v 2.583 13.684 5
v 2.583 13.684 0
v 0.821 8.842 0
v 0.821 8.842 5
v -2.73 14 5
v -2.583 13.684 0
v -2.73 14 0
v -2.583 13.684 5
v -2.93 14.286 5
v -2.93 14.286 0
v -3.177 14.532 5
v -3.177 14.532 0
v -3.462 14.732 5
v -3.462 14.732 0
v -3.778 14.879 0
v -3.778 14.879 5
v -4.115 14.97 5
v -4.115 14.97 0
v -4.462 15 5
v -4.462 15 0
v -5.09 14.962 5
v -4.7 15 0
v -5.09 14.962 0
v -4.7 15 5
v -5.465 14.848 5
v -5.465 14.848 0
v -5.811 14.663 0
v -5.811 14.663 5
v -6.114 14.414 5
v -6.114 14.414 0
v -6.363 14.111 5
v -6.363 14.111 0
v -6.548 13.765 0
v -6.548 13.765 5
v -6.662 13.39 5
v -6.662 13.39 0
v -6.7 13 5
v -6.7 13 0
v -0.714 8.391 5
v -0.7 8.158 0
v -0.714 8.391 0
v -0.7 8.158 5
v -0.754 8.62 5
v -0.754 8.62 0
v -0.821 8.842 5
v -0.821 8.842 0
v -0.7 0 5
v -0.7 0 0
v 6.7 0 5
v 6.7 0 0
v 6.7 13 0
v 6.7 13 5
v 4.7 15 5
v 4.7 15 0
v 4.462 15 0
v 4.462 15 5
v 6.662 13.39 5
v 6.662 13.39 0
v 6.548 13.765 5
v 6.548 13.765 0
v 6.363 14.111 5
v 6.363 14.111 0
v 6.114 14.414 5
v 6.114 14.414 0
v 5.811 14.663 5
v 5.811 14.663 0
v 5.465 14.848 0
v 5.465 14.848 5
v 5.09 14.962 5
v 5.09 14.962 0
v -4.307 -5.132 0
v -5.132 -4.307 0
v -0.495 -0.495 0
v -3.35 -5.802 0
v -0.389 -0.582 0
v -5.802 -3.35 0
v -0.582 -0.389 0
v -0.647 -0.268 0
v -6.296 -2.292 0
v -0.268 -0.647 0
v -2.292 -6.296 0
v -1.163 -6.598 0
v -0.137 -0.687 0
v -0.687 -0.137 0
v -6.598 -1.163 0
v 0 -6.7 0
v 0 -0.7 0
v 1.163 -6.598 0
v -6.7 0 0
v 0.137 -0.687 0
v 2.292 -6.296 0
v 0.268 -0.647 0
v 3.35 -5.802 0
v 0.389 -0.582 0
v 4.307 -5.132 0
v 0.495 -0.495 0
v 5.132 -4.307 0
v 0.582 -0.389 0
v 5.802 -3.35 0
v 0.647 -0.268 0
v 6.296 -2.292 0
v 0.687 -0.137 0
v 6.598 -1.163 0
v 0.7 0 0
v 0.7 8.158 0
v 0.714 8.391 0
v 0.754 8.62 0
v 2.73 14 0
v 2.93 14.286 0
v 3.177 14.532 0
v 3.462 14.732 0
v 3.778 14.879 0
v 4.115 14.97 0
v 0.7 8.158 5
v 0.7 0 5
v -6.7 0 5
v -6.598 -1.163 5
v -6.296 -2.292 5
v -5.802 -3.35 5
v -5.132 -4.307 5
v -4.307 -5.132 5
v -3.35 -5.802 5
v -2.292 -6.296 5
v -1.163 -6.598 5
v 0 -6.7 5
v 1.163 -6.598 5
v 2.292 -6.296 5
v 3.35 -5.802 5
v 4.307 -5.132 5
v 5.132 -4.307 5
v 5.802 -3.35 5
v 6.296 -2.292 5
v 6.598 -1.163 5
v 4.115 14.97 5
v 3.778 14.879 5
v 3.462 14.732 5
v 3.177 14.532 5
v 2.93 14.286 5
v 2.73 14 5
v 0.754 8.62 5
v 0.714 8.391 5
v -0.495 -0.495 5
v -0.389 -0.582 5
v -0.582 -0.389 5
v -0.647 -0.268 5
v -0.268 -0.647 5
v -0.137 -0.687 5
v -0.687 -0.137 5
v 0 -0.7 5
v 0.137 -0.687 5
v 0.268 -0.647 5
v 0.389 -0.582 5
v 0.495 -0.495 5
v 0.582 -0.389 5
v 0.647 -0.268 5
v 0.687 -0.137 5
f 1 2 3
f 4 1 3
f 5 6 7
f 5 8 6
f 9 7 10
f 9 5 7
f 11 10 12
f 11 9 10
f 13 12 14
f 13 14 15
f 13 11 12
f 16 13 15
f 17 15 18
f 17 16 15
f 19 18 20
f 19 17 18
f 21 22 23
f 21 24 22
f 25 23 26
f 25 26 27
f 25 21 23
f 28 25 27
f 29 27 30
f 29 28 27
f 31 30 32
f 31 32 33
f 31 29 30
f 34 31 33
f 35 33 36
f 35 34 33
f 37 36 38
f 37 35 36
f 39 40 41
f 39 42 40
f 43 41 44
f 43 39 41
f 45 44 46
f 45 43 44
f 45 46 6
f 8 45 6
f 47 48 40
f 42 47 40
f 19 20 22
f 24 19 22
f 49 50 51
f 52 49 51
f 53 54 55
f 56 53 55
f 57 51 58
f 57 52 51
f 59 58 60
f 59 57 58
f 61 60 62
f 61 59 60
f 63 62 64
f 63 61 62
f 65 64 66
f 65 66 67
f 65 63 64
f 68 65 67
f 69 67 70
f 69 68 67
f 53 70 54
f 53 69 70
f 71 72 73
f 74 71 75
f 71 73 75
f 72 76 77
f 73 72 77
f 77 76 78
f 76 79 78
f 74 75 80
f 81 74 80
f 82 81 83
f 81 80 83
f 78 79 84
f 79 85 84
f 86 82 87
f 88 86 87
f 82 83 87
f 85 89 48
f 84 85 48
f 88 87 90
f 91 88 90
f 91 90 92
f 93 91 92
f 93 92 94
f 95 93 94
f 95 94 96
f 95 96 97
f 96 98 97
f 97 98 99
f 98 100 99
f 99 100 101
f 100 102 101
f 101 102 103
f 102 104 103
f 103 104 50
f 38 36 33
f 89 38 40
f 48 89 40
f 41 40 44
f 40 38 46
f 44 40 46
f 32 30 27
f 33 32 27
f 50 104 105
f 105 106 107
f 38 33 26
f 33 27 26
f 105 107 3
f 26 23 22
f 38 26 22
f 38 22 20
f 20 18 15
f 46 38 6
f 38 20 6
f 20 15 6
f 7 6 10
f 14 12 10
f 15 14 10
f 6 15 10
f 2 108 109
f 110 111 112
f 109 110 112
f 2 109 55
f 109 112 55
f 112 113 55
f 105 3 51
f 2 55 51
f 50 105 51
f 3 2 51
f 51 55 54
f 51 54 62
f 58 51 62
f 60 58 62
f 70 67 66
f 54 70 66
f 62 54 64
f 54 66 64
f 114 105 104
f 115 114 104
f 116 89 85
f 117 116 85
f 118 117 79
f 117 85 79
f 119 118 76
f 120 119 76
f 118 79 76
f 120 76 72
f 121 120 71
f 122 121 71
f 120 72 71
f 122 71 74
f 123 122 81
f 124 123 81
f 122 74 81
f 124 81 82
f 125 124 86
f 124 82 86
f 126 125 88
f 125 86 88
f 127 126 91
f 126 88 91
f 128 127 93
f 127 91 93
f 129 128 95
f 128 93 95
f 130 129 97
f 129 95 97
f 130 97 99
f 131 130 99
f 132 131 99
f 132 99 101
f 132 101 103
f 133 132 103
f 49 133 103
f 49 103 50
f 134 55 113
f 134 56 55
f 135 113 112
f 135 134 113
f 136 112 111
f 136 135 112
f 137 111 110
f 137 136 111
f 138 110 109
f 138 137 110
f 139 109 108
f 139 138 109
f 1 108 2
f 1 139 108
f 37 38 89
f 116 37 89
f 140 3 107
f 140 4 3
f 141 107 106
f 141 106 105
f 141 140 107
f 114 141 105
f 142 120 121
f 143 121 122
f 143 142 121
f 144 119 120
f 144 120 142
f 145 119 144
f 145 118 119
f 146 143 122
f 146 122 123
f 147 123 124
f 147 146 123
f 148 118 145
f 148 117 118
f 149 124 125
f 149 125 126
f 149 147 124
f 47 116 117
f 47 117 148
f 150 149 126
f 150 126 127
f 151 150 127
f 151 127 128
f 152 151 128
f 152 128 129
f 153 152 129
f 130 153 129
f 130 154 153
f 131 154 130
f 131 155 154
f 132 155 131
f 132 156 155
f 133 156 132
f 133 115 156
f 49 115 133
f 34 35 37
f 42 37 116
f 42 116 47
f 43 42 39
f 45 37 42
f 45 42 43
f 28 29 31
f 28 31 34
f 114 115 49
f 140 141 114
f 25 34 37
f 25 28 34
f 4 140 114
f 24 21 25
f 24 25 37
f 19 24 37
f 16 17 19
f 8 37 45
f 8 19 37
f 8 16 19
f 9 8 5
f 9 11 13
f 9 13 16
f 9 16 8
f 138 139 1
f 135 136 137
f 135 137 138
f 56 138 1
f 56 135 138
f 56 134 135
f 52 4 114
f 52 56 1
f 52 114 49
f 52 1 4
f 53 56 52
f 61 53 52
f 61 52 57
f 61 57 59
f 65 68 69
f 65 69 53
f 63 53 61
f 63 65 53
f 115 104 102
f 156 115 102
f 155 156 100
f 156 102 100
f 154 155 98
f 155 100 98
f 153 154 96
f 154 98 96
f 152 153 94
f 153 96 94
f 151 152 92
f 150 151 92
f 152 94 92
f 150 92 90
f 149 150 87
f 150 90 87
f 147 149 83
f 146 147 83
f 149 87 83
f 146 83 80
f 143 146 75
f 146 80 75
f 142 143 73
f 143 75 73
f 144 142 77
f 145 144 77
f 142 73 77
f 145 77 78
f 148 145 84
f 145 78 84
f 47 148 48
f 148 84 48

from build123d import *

# Parameters (mm, degrees)
BOSS_EXTRUDE1_DEPTH = 5
FILLET2_R           = 2


with BuildPart() as part:
    # Sketch1 → Boss-Extrude1 (new body)
    with BuildSketch(Plane.XY):
        with BuildLine():
            Line((-0.7, 0), (-0.7, 8.511007364))
            Line((-0.7, 8.511007364), (-3.06180017, 15))
            Line((-3.06180017, 15), (-6.7, 15))
            Line((-6.7, 15), (-6.7, 0))
            ThreePointArc((-6.7, 0), (0, -6.7), (6.7, 0))
            Line((6.7, 0), (6.7, 15))
            Line((6.7, 15), (3.06180017, 15))
            Line((3.06180017, 15), (0.7, 8.511007364))
            Line((0.7, 8.511007364), (0.7, 0))
            ThreePointArc((0.7, 0), (0, -0.7), (-0.7, 0))
        make_face()
    extrude(amount=BOSS_EXTRUDE1_DEPTH)

    # Fillet2
    fillet2_edges = [part.edges().sort_by_distance(p)[0] for p in [
        (3.06180017, 15, 2.5),
        (6.7, 15, 2.5),
        (-6.7, 15, 2.5),
        (-3.06180017, 15, 2.5),
        (-0.7, 8.511007364, 2.5),
        (0.7, 8.511007364, 2.5),
    ]]
    fillet(fillet2_edges, radius=FILLET2_R)


solid = part.part
